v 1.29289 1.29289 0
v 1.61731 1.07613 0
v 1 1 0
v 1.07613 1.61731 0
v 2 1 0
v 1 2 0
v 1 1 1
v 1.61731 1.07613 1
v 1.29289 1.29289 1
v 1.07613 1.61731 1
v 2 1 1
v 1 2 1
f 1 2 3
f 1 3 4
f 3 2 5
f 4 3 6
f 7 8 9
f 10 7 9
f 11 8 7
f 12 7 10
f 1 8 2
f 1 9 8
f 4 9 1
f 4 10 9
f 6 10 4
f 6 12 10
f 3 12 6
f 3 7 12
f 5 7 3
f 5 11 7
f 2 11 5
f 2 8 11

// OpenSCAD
// inward rounded offset
linear_extrude(1) offset(r = -1, $fn = 16) polygon([[0, 0], [8, 0], [8, 2], [2, 2], [2, 8], [0, 8]]);
